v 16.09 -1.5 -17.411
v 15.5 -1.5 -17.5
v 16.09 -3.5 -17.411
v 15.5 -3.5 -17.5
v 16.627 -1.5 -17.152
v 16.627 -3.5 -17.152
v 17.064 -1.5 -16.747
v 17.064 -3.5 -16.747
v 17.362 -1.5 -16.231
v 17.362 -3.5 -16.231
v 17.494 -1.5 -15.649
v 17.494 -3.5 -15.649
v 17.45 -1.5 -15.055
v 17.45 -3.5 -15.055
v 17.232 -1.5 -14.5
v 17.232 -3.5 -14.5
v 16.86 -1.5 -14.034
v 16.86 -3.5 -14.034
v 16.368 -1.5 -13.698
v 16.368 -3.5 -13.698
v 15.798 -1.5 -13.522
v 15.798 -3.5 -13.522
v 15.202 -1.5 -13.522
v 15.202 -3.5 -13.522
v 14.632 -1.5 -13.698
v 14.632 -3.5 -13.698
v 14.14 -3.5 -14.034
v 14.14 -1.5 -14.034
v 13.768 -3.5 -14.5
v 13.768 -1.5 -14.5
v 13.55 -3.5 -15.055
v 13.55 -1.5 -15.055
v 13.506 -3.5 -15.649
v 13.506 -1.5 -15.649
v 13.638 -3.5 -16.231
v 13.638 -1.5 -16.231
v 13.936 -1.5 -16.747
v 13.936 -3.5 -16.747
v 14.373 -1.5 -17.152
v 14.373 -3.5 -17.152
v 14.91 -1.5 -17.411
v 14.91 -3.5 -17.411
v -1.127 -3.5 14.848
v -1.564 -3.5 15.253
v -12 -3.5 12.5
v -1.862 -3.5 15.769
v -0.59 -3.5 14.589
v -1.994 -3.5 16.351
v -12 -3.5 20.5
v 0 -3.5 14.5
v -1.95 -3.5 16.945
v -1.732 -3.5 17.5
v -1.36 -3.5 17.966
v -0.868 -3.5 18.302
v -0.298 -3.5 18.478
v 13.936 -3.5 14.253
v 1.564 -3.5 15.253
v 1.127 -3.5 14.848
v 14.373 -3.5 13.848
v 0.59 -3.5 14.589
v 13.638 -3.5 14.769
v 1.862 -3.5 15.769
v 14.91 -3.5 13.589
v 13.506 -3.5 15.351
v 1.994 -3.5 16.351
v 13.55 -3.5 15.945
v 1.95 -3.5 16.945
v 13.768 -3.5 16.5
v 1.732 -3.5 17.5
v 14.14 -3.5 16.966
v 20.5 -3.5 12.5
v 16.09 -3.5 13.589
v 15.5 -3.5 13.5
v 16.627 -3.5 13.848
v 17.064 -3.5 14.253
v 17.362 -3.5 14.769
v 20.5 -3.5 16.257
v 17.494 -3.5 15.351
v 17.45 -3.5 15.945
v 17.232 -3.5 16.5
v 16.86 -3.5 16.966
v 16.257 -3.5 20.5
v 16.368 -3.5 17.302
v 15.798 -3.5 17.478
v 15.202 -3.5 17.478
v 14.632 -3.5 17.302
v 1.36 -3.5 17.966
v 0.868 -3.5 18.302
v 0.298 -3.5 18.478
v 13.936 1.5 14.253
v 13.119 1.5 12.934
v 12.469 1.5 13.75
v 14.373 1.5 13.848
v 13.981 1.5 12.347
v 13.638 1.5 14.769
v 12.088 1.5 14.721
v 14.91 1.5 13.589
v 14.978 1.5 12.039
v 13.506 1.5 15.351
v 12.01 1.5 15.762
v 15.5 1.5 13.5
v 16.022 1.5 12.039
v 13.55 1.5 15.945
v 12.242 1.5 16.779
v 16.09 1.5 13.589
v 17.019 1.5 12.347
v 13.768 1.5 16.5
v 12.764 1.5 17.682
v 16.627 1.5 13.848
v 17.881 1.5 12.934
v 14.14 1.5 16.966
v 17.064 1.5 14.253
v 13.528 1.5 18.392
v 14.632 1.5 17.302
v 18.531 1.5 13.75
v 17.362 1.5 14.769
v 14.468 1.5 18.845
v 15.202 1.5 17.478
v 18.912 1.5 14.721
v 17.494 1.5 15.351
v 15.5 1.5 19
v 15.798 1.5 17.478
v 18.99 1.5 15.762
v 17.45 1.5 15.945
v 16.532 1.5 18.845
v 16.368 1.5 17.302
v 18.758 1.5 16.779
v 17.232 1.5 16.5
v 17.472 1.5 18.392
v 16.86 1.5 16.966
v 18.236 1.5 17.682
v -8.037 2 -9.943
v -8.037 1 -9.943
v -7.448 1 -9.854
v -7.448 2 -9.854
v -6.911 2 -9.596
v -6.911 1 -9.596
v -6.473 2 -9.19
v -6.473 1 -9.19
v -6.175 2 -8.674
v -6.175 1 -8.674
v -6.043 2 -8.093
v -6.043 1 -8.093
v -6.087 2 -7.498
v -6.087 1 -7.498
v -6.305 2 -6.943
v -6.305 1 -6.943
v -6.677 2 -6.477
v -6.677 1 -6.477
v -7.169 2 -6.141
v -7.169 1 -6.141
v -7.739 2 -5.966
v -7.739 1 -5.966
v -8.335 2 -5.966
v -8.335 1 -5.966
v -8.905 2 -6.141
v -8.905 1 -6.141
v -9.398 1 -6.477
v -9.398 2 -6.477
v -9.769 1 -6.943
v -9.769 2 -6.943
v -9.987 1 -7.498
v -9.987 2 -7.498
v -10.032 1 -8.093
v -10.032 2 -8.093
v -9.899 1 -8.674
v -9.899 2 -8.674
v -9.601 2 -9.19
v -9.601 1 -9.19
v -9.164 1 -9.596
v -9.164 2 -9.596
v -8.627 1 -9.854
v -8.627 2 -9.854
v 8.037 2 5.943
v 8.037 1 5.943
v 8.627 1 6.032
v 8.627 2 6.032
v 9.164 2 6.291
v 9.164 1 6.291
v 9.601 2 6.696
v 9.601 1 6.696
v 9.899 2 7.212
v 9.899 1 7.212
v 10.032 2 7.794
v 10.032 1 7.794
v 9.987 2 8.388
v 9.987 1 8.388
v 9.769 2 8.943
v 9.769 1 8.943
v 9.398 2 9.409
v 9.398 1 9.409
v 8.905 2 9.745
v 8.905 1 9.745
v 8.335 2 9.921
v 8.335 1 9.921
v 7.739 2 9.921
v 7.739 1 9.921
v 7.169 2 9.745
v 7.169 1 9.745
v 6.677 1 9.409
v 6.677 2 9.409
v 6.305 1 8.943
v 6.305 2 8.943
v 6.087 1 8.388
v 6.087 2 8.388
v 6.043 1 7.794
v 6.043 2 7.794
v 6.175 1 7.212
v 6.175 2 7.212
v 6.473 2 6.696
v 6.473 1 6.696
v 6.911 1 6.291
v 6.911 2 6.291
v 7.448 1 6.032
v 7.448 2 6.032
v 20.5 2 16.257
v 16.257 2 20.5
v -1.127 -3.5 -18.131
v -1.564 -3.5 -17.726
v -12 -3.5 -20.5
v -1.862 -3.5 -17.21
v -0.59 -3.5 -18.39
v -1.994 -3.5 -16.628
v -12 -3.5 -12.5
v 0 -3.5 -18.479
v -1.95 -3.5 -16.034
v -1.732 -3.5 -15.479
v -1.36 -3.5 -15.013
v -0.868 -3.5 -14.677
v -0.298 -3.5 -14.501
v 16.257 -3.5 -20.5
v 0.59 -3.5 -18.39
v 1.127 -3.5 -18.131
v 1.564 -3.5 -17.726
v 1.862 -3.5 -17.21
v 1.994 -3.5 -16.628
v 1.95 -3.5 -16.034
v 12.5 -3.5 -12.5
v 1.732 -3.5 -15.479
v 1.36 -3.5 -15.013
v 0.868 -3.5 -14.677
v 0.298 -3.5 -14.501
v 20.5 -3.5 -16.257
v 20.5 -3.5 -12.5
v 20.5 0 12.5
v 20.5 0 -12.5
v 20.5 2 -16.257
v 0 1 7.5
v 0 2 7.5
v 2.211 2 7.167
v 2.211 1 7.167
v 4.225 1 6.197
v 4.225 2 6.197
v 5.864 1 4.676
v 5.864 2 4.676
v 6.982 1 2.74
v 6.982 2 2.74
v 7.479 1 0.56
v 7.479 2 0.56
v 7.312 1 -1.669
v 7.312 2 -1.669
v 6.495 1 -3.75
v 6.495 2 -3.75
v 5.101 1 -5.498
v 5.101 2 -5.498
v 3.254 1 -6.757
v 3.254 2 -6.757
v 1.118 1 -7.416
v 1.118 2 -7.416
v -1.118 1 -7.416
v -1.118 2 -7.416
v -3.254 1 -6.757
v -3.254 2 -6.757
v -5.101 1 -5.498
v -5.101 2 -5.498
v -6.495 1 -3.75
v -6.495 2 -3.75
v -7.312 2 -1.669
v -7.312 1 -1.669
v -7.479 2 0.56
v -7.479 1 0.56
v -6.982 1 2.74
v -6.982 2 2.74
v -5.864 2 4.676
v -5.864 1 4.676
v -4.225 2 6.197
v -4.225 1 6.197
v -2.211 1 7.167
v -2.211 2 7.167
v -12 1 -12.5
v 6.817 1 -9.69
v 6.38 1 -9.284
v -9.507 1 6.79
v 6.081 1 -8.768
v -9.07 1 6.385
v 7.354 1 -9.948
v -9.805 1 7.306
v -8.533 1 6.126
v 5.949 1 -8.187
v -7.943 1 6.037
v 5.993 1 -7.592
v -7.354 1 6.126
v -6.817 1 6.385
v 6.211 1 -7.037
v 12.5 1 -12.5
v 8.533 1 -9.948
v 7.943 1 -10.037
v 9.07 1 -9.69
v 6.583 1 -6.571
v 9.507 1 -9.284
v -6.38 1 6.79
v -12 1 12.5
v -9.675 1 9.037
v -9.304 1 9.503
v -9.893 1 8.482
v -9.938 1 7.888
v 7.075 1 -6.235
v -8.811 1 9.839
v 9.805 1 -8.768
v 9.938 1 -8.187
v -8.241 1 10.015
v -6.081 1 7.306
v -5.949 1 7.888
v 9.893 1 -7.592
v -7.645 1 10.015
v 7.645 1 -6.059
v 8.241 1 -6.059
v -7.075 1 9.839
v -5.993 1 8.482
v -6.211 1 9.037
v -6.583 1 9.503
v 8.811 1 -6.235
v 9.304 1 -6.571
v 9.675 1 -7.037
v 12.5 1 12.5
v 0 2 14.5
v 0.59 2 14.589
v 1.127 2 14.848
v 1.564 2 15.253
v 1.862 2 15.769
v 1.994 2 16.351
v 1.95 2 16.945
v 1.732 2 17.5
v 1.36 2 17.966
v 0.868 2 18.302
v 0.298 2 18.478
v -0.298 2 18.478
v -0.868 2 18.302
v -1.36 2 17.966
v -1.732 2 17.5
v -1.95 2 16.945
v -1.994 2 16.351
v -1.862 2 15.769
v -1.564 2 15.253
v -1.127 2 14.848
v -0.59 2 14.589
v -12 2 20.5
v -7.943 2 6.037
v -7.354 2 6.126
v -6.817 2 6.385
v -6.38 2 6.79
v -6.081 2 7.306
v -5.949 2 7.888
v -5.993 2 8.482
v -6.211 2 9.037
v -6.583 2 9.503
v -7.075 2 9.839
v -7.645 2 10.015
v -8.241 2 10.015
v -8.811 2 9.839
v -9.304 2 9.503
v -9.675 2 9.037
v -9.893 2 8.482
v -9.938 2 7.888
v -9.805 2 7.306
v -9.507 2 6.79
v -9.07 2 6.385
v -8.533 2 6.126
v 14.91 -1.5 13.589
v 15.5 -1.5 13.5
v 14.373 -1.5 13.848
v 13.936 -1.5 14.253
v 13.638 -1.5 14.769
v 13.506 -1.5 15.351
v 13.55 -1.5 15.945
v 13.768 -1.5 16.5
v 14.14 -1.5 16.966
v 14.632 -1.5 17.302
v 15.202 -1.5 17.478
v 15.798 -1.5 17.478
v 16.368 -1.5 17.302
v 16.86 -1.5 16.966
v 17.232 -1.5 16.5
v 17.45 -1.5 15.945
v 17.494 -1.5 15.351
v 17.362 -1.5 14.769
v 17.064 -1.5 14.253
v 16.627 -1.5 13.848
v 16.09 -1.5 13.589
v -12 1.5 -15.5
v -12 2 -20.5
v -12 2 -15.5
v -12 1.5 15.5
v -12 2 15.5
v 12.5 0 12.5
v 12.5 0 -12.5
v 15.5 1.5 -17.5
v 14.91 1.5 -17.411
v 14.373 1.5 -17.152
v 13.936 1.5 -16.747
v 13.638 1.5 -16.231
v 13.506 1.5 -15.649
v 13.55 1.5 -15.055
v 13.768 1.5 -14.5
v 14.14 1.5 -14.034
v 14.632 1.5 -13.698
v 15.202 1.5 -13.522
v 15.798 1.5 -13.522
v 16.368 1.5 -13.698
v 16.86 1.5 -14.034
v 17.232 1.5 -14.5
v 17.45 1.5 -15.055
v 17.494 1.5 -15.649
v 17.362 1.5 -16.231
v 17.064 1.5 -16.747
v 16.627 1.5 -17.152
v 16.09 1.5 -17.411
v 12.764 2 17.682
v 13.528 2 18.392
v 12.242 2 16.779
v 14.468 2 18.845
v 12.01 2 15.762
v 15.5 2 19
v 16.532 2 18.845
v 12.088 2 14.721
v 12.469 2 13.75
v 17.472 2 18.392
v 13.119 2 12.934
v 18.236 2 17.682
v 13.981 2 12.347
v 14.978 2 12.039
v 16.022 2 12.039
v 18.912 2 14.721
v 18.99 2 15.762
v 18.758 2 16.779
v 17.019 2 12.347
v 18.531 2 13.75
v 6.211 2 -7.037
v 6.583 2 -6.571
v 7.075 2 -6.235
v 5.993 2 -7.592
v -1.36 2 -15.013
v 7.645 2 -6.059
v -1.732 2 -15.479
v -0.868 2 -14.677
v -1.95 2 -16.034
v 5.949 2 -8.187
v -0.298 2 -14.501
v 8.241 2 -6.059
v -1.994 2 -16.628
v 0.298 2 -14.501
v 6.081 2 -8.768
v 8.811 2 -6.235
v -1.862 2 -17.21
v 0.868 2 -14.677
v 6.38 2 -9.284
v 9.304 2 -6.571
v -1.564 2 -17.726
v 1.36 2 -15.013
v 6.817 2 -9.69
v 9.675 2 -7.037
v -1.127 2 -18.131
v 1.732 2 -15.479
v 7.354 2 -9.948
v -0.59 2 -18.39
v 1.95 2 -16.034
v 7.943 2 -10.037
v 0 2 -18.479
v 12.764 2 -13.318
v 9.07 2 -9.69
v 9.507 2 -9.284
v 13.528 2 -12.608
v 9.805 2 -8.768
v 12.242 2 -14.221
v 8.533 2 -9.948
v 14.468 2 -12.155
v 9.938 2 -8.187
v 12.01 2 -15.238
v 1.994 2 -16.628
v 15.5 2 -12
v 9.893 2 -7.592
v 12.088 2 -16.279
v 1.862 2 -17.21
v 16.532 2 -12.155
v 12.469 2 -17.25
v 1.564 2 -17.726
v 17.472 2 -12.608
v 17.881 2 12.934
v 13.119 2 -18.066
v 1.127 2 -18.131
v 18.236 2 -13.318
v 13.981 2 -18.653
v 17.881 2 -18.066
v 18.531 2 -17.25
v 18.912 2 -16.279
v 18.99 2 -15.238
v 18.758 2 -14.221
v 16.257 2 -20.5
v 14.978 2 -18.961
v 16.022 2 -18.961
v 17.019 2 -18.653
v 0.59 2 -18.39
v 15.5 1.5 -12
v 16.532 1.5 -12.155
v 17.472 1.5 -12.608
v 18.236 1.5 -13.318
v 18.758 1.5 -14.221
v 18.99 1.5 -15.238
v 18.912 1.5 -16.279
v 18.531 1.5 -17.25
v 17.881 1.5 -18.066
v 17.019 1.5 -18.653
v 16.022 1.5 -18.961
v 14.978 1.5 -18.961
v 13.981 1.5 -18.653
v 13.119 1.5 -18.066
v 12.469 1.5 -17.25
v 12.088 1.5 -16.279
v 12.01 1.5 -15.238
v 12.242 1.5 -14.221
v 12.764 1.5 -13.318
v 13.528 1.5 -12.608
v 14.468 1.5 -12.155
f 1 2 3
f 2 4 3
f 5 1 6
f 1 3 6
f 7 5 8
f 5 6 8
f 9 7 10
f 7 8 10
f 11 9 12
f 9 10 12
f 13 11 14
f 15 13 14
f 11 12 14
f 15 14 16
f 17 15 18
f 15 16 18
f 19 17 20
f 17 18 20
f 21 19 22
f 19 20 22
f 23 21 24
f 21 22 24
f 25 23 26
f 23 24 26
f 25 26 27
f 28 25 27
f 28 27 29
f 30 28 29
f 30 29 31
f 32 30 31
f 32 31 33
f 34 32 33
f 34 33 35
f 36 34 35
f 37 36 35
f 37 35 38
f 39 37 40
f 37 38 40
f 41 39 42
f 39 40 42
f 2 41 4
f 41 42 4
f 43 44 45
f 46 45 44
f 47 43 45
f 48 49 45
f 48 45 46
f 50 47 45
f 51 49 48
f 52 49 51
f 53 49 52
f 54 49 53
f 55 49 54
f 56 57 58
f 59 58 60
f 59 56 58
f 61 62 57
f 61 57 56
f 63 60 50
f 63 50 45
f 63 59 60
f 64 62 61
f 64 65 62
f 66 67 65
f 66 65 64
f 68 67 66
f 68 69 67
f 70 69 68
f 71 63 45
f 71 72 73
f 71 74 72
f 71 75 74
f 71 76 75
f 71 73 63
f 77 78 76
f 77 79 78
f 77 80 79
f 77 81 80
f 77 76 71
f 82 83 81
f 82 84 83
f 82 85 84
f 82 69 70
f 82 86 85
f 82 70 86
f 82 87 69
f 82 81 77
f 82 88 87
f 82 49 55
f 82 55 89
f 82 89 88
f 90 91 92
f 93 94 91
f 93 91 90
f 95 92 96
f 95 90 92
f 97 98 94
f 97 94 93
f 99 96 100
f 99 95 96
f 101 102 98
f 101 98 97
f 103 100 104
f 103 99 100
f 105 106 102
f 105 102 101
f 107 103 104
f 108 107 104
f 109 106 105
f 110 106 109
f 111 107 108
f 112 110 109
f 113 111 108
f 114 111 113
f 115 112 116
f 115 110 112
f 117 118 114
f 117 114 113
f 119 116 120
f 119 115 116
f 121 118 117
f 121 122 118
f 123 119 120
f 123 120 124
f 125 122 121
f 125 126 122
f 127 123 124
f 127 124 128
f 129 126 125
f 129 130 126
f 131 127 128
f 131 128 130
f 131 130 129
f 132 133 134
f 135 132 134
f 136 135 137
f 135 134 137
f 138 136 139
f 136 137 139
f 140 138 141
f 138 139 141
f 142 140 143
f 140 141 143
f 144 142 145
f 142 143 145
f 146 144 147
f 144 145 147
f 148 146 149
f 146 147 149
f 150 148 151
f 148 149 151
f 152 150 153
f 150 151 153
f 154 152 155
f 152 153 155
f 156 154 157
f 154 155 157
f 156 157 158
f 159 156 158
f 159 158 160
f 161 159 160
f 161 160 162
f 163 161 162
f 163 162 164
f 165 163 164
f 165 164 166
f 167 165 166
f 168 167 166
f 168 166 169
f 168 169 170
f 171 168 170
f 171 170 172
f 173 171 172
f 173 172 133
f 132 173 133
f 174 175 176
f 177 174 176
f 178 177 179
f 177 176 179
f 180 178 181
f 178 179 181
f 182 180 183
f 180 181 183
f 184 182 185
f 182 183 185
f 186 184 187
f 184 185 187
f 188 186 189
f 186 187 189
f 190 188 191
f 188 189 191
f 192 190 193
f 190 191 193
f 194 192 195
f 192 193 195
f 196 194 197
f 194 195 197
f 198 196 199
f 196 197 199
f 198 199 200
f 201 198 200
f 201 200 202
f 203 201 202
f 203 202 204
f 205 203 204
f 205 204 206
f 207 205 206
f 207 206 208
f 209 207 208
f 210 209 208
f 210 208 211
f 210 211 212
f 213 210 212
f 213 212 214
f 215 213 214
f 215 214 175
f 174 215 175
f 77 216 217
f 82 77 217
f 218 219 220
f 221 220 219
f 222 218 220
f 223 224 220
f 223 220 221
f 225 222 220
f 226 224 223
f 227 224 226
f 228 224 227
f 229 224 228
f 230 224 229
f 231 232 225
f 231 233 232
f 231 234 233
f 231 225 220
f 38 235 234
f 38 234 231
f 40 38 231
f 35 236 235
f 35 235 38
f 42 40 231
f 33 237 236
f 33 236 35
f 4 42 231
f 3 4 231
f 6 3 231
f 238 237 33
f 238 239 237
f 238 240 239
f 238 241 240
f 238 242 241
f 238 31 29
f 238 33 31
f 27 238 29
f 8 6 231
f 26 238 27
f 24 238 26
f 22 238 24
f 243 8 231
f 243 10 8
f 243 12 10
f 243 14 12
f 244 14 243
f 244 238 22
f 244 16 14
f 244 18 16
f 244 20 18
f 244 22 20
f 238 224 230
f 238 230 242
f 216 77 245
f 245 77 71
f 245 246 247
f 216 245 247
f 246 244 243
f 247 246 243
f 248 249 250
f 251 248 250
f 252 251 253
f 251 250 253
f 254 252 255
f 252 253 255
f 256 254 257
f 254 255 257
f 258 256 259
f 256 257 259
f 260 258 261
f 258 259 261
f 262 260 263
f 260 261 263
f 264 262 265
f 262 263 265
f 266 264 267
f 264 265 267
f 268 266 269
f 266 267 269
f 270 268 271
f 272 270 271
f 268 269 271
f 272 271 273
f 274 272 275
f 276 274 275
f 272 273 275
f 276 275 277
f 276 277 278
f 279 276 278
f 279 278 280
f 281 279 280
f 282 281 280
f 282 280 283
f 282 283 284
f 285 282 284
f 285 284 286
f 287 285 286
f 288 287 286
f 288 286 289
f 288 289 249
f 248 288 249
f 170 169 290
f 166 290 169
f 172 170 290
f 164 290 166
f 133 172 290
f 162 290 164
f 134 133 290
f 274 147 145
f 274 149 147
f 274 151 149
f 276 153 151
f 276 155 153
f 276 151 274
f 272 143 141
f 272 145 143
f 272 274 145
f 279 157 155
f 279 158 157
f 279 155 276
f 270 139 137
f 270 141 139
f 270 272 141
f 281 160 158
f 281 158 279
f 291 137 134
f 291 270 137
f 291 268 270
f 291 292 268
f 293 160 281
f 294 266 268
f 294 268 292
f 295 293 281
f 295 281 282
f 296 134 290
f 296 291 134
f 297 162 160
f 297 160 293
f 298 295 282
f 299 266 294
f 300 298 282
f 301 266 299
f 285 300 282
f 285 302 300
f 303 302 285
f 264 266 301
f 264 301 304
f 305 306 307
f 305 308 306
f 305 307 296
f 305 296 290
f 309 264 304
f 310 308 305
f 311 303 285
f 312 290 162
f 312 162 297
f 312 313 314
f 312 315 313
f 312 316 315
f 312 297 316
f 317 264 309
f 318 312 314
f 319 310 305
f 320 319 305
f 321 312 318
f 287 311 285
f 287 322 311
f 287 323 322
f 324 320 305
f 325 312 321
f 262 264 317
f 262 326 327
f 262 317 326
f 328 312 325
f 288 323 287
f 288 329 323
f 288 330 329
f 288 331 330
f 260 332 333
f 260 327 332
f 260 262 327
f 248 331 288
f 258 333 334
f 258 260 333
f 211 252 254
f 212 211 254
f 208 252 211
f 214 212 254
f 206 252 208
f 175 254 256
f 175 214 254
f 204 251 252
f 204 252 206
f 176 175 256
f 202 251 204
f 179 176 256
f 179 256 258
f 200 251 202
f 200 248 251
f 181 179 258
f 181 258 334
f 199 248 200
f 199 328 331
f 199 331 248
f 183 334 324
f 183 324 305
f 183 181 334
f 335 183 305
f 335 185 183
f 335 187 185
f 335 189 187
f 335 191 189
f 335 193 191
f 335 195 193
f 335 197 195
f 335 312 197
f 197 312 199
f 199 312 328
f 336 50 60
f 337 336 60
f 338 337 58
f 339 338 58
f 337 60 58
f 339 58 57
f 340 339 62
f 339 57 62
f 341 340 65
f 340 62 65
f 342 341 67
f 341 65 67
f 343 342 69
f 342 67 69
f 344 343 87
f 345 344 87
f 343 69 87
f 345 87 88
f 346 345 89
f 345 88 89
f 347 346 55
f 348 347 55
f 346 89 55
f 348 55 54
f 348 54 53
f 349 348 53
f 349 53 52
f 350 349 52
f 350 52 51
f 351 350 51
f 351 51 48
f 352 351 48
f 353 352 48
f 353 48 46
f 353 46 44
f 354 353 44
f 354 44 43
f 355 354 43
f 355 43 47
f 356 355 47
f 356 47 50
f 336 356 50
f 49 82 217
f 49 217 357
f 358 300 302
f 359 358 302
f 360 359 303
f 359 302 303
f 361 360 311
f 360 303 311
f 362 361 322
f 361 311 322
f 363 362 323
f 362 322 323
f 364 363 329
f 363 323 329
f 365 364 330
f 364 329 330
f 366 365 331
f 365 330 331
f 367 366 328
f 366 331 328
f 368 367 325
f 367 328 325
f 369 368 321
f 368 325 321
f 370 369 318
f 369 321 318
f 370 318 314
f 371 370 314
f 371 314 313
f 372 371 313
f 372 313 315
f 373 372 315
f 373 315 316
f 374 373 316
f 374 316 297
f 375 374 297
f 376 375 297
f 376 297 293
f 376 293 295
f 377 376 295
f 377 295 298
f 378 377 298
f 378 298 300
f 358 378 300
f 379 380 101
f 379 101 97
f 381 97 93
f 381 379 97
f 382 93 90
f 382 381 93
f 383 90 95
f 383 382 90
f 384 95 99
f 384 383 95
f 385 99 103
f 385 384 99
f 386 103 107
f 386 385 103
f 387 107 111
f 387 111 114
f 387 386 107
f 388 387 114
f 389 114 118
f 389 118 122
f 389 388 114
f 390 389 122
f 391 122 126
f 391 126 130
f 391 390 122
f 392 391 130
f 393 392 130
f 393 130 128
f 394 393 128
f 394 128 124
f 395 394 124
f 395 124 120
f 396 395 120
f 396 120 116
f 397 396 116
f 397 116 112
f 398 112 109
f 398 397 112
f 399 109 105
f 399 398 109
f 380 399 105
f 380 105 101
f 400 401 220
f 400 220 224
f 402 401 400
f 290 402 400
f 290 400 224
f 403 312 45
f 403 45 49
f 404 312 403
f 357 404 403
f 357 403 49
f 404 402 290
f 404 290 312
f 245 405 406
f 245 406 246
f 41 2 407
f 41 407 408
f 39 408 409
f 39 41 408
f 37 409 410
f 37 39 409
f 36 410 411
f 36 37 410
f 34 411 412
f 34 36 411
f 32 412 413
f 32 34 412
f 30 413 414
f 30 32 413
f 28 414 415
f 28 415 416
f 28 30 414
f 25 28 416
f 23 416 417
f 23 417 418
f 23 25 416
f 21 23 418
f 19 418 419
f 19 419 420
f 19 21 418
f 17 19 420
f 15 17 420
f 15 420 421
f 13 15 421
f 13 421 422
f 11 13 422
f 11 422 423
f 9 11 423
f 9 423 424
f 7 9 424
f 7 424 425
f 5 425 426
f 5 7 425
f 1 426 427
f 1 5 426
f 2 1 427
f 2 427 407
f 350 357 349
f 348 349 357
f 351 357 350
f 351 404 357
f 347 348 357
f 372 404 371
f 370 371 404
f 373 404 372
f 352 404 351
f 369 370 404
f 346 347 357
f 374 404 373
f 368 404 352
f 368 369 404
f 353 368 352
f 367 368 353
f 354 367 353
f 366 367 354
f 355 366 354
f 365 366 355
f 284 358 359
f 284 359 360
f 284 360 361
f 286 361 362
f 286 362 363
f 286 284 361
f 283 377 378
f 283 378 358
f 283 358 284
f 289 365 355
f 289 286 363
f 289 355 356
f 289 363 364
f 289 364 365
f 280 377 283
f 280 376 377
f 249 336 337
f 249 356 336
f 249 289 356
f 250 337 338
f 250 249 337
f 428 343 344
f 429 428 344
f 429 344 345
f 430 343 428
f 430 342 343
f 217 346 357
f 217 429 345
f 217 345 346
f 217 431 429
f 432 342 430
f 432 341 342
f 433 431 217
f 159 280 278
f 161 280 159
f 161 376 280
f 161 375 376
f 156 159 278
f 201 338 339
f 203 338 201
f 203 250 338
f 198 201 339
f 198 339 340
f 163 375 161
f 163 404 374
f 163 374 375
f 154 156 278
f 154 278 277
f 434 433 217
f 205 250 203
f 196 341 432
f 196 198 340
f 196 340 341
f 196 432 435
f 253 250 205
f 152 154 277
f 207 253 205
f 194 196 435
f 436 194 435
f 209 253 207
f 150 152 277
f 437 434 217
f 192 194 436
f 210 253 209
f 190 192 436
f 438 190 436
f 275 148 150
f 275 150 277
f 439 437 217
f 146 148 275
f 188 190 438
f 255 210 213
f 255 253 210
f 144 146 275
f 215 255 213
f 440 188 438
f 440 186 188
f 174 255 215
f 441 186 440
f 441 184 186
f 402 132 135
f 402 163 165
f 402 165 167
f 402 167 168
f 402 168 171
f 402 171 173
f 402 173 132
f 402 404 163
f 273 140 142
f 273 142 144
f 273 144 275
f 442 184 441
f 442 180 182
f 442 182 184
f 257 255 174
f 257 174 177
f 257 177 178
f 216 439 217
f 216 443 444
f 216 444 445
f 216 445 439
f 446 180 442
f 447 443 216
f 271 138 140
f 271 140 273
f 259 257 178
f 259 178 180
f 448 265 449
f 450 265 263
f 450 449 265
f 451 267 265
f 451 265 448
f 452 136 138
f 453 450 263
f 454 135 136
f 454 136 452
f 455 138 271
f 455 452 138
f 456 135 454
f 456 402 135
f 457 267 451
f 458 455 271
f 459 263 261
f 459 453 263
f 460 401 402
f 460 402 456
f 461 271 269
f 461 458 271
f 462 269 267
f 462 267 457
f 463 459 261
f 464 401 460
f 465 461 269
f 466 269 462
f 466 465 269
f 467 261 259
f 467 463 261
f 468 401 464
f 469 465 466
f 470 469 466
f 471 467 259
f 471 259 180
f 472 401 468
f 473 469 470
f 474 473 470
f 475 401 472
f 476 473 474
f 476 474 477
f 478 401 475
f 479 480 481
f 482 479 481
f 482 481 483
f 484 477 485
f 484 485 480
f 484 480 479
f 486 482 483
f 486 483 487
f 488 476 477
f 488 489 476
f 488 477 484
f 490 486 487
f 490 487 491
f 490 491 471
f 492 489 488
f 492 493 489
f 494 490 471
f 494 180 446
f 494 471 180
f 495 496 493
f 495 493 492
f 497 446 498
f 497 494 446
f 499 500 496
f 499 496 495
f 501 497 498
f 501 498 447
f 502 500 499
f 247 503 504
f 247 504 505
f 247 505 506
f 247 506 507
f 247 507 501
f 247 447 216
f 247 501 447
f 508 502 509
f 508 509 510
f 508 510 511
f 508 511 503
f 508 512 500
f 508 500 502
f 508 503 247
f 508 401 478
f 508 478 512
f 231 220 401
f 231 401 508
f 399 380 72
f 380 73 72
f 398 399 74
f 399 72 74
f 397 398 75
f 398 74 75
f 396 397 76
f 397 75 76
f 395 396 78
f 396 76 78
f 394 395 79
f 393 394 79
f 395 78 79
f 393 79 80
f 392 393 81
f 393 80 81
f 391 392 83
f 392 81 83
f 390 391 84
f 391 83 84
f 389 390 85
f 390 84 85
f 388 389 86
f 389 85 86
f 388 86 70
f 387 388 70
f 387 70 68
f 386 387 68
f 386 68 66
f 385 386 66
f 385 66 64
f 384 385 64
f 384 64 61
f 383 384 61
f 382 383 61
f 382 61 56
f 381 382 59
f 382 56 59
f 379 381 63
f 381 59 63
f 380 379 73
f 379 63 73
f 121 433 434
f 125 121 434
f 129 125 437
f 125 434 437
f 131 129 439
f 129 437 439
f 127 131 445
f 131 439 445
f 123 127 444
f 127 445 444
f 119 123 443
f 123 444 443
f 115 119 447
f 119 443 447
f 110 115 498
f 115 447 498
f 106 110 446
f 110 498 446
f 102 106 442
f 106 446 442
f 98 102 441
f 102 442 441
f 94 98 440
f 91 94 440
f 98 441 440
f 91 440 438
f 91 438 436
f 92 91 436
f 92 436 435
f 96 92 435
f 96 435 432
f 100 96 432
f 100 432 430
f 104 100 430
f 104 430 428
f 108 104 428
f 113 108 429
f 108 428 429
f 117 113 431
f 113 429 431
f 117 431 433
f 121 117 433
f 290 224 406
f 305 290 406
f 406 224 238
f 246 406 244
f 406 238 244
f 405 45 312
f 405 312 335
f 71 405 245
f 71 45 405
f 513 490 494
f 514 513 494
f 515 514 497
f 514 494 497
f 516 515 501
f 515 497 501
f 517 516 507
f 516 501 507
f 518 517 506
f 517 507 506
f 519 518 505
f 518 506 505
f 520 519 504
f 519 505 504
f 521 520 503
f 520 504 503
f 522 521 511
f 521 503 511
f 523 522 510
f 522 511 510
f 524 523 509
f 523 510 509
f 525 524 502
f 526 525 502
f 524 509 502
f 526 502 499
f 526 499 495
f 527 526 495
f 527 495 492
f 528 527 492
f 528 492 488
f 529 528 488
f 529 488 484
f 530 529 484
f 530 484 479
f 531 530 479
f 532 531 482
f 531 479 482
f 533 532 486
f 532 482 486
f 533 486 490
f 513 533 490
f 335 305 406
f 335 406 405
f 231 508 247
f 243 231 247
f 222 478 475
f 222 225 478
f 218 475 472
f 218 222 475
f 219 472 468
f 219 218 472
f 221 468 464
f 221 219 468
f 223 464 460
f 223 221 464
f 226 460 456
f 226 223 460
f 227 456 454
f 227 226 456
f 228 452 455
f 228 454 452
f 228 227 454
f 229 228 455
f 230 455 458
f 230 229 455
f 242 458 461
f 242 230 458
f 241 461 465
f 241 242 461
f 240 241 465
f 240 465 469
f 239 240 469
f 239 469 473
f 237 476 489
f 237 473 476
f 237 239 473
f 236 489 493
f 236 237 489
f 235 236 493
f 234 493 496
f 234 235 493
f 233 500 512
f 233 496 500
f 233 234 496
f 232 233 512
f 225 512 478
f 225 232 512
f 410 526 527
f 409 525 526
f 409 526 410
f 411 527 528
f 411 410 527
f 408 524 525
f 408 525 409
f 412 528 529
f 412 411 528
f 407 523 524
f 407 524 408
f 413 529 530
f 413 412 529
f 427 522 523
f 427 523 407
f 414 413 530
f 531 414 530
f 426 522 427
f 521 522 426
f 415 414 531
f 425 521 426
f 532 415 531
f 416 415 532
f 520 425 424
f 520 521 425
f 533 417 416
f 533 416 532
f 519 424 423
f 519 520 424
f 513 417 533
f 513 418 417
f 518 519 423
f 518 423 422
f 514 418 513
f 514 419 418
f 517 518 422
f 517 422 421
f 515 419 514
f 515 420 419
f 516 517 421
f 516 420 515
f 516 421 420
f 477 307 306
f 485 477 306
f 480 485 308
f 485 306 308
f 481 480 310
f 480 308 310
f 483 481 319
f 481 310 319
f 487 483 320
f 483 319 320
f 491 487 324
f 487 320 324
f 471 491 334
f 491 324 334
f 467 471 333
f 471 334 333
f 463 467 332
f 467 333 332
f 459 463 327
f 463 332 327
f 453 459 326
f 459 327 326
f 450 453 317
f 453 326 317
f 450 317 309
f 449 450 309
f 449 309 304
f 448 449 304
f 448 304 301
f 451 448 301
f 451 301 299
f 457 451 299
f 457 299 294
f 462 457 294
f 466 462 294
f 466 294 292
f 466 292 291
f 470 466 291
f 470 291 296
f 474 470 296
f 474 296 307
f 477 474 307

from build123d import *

# Parameters (mm, degrees)
SKETCH2_W           = 41
SKETCH2_H           = 41
BOSS_EXTRUDE1_DEPTH = 2
SKETCH3_R           = 2
CUT_EXTRUDE1_DEPTH  = 30.060282173
SKETCH4_R           = 7.5
CUT_EXTRUDE2_DEPTH  = 30.060282173
SKETCH5_W           = 25
SKETCH5_H           = 25
CUT_EXTRUDE3_DEPTH  = 1
CUT_EXTRUDE4_DEPTH  = 30.060282173
SKETCH7_R           = 2
CUT_EXTRUDE5_DEPTH  = 30.060282173
SKETCH8_W           = 25
SKETCH8_H           = 8
SKETCH8_H_2         = 7.957817611
BOSS_EXTRUDE2_DEPTH = 3.5
SKETCH9_R           = 2
CUT_EXTRUDE6_DEPTH  = 30.508473359
BOSS_EXTRUDE3_START = 3.5
SKETCH10_R          = 2
BOSS_EXTRUDE3_DEPTH = 3.5
SKETCH11_R          = 3.5
CUT_EXTRUDE7_DEPTH  = 3.5
SKETCH12_W          = 8
SKETCH12_H          = 2
BOSS_EXTRUDE4_DEPTH = 3.5
SKETCH13_R          = 3.5
CUT_EXTRUDE8_DEPTH  = 3.5
SKETCH14_R          = 3.5
SKETCH14_R_2        = 2
BOSS_EXTRUDE5_DEPTH = 3
SKETCH15_W          = 16
SKETCH15_H          = 8.042182389
SKETCH15_R          = 2
SKETCH15_H_2        = 8
BOSS_EXTRUDE6_DEPTH = 4
SKETCH16_W          = 8
SKETCH16_H          = 25
CUT_EXTRUDE9_DEPTH  = 3.5
SKETCH18_W          = 32.514718626
SKETCH18_H          = 41
CUT_EXTRUDE10_DEPTH = 4
CUT_EXTRUDE12_DEPTH = 30.508473359


with BuildPart() as part:
    # Sketch2 → Boss-Extrude1 (new body)
    with BuildSketch(Plane(origin=(0, 0, 0), x_dir=(1, 0, 0), z_dir=(0, 1, 0))):
        Rectangle(SKETCH2_W, SKETCH2_H)
    extrude(amount=BOSS_EXTRUDE1_DEPTH)

    # Sketch3 → Cut-Extrude1 (cut, through all)
    with BuildSketch(Plane.XZ):
        with Locations(Location((-7.943181907, 8.037155044, 0), (0, 0, 270))):
            Circle(SKETCH3_R)
        with Locations(Location((8.037155044, 7.943181907, 0), (0, 0, 270))):
            Circle(SKETCH3_R)
        with Locations(Location((7.943181907, -8.037155044, 0), (0, 0, 270))):
            Circle(SKETCH3_R)
        with Locations(Location((-8.037155044, -7.943181907, 0), (0, 0, 270))):
            Circle(SKETCH3_R)
    extrude(amount=-CUT_EXTRUDE1_DEPTH, mode=Mode.SUBTRACT)

    # Sketch4 → Cut-Extrude2 (cut, through all)
    with BuildSketch(Plane(origin=(0, 2, 0), x_dir=(1, 0, 0), z_dir=(0, 1, 0))):
        with Locations(Location((0, 0, 0), (0, 0, 270))):
            Circle(SKETCH4_R)
    extrude(amount=-CUT_EXTRUDE2_DEPTH, mode=Mode.SUBTRACT)

    # Sketch5 → Cut-Extrude3 (cut)
    with BuildSketch(Plane.XZ):
        Rectangle(SKETCH5_W, SKETCH5_H)
    extrude(amount=-CUT_EXTRUDE3_DEPTH, mode=Mode.SUBTRACT)

    # Sketch6 → Cut-Extrude4 (cut, through all)
    with BuildSketch(Plane(origin=(0, 2, 0), x_dir=(1, 0, 0), z_dir=(0, 1, 0))):
        Polygon((-20.5, 16.257359313), (-16.257359313, 20.5), (-20.5, 20.5), align=None)
        Polygon((16.257359313, 20.5), (20.5, 16.257359313), (20.5, 20.5), align=None)
        Polygon((20.5, -16.257359313), (16.257359313, -20.5), (20.5, -20.5), align=None)
        Polygon((-16.257359313, -20.5), (-20.5, -16.257359313), (-20.5, -20.5), align=None)
    extrude(amount=-CUT_EXTRUDE4_DEPTH, mode=Mode.SUBTRACT)

    # Sketch7 → Cut-Extrude5 (cut, through all)
    with BuildSketch(Plane.XZ):
        with Locations(Location((-15.5, 15.5, 0), (0, 0, 270))):
            Circle(SKETCH7_R)
        with Locations(Location((15.5, 15.5, 0), (0, 0, 270))):
            Circle(SKETCH7_R)
        with Locations(Location((15.5, -15.5, 0), (0, 0, 270))):
            Circle(SKETCH7_R)
        with Locations(Location((-15.5, -15.5, 0), (0, 0, 270))):
            Circle(SKETCH7_R)
    extrude(amount=-CUT_EXTRUDE5_DEPTH, mode=Mode.SUBTRACT)

    # Sketch8 → Boss-Extrude2 (add)
    with BuildSketch(Plane.XZ):
        with Locations((0, 16.5)):
            Rectangle(SKETCH8_W, SKETCH8_H)
        with Locations((0, -16.478908806)):
            Rectangle(SKETCH8_W, SKETCH8_H_2)
    extrude(amount=BOSS_EXTRUDE2_DEPTH)

    # Sketch9 → Cut-Extrude6 (cut, through all)
    with BuildSketch(Plane.XZ.offset(3.5)):
        with Locations(Location((0, 16.5, 0), (0, 0, 270))):
            Circle(SKETCH9_R)
        with Locations(Location((0, -16.478908806, 0), (0, 0, 270))):
            Circle(SKETCH9_R)
    extrude(amount=-CUT_EXTRUDE6_DEPTH, mode=Mode.SUBTRACT)

    # Sketch10 → Boss-Extrude3 (add)
    # profile 1 of 3: a face of its own
    with BuildSketch(Plane.XZ.offset(BOSS_EXTRUDE3_START)):
        Polygon((-20.5, 16.257359313), (-20.5, 12.5), (-12.5, 12.5), (-12.5, 20.5), (-16.257359313, 20.5), align=None)
        with Locations(Location((-15.5, 15.5, 0), (0, 0, 270))):
            Circle(SKETCH10_R, mode=Mode.SUBTRACT)
    # profile 2 of 3: a face of its own
    with BuildSketch(Plane.XZ.offset(BOSS_EXTRUDE3_START)):
        Polygon((12.5, 12.5), (20.5, 12.5), (20.5, 16.257359313), (16.257359313, 20.5), (12.5, 20.5), align=None)
        with Locations(Location((15.5, 15.5, 0), (0, 0, 270))):
            Circle(SKETCH10_R, mode=Mode.SUBTRACT)
    # profile 3 of 3: a face of its own
    with BuildSketch(Plane.XZ.offset(BOSS_EXTRUDE3_START)):
        Polygon((-20.5, -12.5), (-20.5, -16.257359313), (-16.257359313, -20.5), (16.257359313, -20.5), (20.5, -16.257359313), (20.5, -12.5), (12.5, -12.5), (12.5, -20.457817611), (-12.5, -20.457817611), (-12.5, -12.5), align=None)
        with Locations(Location((-15.5, -15.5, 0), (0, 0, 270))):
            Circle(SKETCH10_R, mode=Mode.SUBTRACT)
        with Locations(Location((15.5, -15.5, 0), (0, 0, 270))):
            Circle(SKETCH10_R, mode=Mode.SUBTRACT)
    extrude(amount=-BOSS_EXTRUDE3_DEPTH)

    # Sketch11 → Cut-Extrude7 (cut)
    with BuildSketch(Plane(origin=(0, 2, 0), x_dir=(1, 0, 0), z_dir=(0, 1, 0))):
        with Locations(Location((-15.5, 15.5, 0), (0, 0, 270))):
            Circle(SKETCH11_R)
        with Locations(Location((15.5, 15.5, 0), (0, 0, 270))):
            Circle(SKETCH11_R)
        with Locations(Location((15.5, -15.5, 0), (0, 0, 270))):
            Circle(SKETCH11_R)
        with Locations(Location((-15.5, -15.5, 0), (0, 0, 270))):
            Circle(SKETCH11_R)
    extrude(amount=-CUT_EXTRUDE7_DEPTH, mode=Mode.SUBTRACT)

    # Sketch12 → Boss-Extrude4 (add)
    with BuildSketch(Plane.XZ):
        with Locations((-16.5, -11.5)):
            Rectangle(SKETCH12_W, SKETCH12_H)
        with Locations((-16.5, 11.5)):
            Rectangle(SKETCH12_W, SKETCH12_H)
        with Locations((16.5, -11.5)):
            Rectangle(SKETCH12_W, SKETCH12_H)
        with Locations((16.5, 11.5)):
            Rectangle(SKETCH12_W, SKETCH12_H)
    extrude(amount=BOSS_EXTRUDE4_DEPTH)

    # Sketch13 → Cut-Extrude8 (cut)
    with BuildSketch(Plane(origin=(0, 2, 0), x_dir=(1, 0, 0), z_dir=(0, 1, 0))):
        with Locations(Location((-15.5, 15.5, 0), (0, 0, 270))):
            Circle(SKETCH13_R)
        with Locations(Location((15.5, 15.5, 0), (0, 0, 270))):
            Circle(SKETCH13_R)
        with Locations(Location((15.5, -15.5, 0), (0, 0, 270))):
            Circle(SKETCH13_R)
        with Locations(Location((-15.5, -15.5, 0), (0, 0, 270))):
            Circle(SKETCH13_R)
    extrude(amount=-CUT_EXTRUDE8_DEPTH, mode=Mode.SUBTRACT)

    # Sketch14 → Boss-Extrude5 (add)
    # profile 1 of 4: a face of its own
    with BuildSketch(Plane(origin=(0, -1.5, 0), x_dir=(1, 0, 0), z_dir=(0, 1, 0))):
        with Locations(Location((-15.5, -15.5, 0), (0, 0, 270))):
            Circle(SKETCH14_R)
        with Locations(Location((-15.5, -15.5, 0), (0, 0, 90))):
            Circle(SKETCH14_R_2, mode=Mode.SUBTRACT)
    # profile 2 of 4: a face of its own
    with BuildSketch(Plane(origin=(0, -1.5, 0), x_dir=(1, 0, 0), z_dir=(0, 1, 0))):
        with Locations(Location((-15.5, 15.5, 0), (0, 0, 270))):
            Circle(SKETCH14_R)
        with Locations(Location((-15.5, 15.5, 0), (0, 0, 90))):
            Circle(SKETCH14_R_2, mode=Mode.SUBTRACT)
    # profile 3 of 4: a face of its own
    with BuildSketch(Plane(origin=(0, -1.5, 0), x_dir=(1, 0, 0), z_dir=(0, 1, 0))):
        with Locations(Location((15.5, 15.5, 0), (0, 0, 270))):
            Circle(SKETCH14_R)
        with Locations(Location((15.5, 15.5, 0), (0, 0, 90))):
            Circle(SKETCH14_R_2, mode=Mode.SUBTRACT)
    # profile 4 of 4: a face of its own
    with BuildSketch(Plane(origin=(0, -1.5, 0), x_dir=(1, 0, 0), z_dir=(0, 1, 0))):
        with Locations(Location((15.5, -15.5, 0), (0, 0, 270))):
            Circle(SKETCH14_R)
        with Locations(Location((15.5, -15.5, 0), (0, 0, 90))):
            Circle(SKETCH14_R_2, mode=Mode.SUBTRACT)
    extrude(amount=BOSS_EXTRUDE5_DEPTH)

    # Sketch15 → Boss-Extrude6 (add)
    # profile 1 of 2: a face of its own
    with BuildSketch(Plane(origin=(0, 2, 0), x_dir=(1, 0, 0), z_dir=(0, 1, 0))):
        with Locations((0, 16.478908806)):
            Rectangle(SKETCH15_W, SKETCH15_H)
        with Locations(Location((0, 16.478908806, 0), (0, 0, 90))):
            Circle(SKETCH15_R, mode=Mode.SUBTRACT)
    # profile 2 of 2: a face of its own
    with BuildSketch(Plane(origin=(0, 2, 0), x_dir=(1, 0, 0), z_dir=(0, 1, 0))):
        with Locations((0, -16.5)):
            Rectangle(SKETCH15_W, SKETCH15_H_2)
        with Locations(Location((0, -16.478908806, 0), (0, 0, 90))):
            Circle(SKETCH15_R, mode=Mode.SUBTRACT)
    extrude(amount=BOSS_EXTRUDE6_DEPTH)

    # Sketch16 → Cut-Extrude9 (cut)
    with BuildSketch(Plane.XZ.offset(3.5)):
        with Locations((-16.5, 0)):
            Rectangle(SKETCH16_W, SKETCH16_H)
        with Locations((16.5, 0)):
            Rectangle(SKETCH16_W, SKETCH16_H)
    extrude(amount=-CUT_EXTRUDE9_DEPTH, mode=Mode.SUBTRACT)

    # Sketch18 → Cut-Extrude10 (cut)
    with BuildSketch(Plane(origin=(0, 6, 0), x_dir=(1, 0, 0), z_dir=(0, 1, 0))):
        Rectangle(SKETCH18_W, SKETCH18_H)
    extrude(amount=-CUT_EXTRUDE10_DEPTH, mode=Mode.SUBTRACT)

    # Sketch19 → Cut-Extrude12 (cut, through all)
    with BuildSketch(Plane(origin=(0, 2, 0), x_dir=(1, 0, 0), z_dir=(0, 1, 0))):
        Polygon((-12, 20.5), (-12, -20.5), (-16.257359313, -20.5), (-20.5, -16.257359313), (-20.5, 16.257359313), (-16.257359313, 20.5), align=None)
    extrude(amount=-CUT_EXTRUDE12_DEPTH, mode=Mode.SUBTRACT)


solid = part.part
